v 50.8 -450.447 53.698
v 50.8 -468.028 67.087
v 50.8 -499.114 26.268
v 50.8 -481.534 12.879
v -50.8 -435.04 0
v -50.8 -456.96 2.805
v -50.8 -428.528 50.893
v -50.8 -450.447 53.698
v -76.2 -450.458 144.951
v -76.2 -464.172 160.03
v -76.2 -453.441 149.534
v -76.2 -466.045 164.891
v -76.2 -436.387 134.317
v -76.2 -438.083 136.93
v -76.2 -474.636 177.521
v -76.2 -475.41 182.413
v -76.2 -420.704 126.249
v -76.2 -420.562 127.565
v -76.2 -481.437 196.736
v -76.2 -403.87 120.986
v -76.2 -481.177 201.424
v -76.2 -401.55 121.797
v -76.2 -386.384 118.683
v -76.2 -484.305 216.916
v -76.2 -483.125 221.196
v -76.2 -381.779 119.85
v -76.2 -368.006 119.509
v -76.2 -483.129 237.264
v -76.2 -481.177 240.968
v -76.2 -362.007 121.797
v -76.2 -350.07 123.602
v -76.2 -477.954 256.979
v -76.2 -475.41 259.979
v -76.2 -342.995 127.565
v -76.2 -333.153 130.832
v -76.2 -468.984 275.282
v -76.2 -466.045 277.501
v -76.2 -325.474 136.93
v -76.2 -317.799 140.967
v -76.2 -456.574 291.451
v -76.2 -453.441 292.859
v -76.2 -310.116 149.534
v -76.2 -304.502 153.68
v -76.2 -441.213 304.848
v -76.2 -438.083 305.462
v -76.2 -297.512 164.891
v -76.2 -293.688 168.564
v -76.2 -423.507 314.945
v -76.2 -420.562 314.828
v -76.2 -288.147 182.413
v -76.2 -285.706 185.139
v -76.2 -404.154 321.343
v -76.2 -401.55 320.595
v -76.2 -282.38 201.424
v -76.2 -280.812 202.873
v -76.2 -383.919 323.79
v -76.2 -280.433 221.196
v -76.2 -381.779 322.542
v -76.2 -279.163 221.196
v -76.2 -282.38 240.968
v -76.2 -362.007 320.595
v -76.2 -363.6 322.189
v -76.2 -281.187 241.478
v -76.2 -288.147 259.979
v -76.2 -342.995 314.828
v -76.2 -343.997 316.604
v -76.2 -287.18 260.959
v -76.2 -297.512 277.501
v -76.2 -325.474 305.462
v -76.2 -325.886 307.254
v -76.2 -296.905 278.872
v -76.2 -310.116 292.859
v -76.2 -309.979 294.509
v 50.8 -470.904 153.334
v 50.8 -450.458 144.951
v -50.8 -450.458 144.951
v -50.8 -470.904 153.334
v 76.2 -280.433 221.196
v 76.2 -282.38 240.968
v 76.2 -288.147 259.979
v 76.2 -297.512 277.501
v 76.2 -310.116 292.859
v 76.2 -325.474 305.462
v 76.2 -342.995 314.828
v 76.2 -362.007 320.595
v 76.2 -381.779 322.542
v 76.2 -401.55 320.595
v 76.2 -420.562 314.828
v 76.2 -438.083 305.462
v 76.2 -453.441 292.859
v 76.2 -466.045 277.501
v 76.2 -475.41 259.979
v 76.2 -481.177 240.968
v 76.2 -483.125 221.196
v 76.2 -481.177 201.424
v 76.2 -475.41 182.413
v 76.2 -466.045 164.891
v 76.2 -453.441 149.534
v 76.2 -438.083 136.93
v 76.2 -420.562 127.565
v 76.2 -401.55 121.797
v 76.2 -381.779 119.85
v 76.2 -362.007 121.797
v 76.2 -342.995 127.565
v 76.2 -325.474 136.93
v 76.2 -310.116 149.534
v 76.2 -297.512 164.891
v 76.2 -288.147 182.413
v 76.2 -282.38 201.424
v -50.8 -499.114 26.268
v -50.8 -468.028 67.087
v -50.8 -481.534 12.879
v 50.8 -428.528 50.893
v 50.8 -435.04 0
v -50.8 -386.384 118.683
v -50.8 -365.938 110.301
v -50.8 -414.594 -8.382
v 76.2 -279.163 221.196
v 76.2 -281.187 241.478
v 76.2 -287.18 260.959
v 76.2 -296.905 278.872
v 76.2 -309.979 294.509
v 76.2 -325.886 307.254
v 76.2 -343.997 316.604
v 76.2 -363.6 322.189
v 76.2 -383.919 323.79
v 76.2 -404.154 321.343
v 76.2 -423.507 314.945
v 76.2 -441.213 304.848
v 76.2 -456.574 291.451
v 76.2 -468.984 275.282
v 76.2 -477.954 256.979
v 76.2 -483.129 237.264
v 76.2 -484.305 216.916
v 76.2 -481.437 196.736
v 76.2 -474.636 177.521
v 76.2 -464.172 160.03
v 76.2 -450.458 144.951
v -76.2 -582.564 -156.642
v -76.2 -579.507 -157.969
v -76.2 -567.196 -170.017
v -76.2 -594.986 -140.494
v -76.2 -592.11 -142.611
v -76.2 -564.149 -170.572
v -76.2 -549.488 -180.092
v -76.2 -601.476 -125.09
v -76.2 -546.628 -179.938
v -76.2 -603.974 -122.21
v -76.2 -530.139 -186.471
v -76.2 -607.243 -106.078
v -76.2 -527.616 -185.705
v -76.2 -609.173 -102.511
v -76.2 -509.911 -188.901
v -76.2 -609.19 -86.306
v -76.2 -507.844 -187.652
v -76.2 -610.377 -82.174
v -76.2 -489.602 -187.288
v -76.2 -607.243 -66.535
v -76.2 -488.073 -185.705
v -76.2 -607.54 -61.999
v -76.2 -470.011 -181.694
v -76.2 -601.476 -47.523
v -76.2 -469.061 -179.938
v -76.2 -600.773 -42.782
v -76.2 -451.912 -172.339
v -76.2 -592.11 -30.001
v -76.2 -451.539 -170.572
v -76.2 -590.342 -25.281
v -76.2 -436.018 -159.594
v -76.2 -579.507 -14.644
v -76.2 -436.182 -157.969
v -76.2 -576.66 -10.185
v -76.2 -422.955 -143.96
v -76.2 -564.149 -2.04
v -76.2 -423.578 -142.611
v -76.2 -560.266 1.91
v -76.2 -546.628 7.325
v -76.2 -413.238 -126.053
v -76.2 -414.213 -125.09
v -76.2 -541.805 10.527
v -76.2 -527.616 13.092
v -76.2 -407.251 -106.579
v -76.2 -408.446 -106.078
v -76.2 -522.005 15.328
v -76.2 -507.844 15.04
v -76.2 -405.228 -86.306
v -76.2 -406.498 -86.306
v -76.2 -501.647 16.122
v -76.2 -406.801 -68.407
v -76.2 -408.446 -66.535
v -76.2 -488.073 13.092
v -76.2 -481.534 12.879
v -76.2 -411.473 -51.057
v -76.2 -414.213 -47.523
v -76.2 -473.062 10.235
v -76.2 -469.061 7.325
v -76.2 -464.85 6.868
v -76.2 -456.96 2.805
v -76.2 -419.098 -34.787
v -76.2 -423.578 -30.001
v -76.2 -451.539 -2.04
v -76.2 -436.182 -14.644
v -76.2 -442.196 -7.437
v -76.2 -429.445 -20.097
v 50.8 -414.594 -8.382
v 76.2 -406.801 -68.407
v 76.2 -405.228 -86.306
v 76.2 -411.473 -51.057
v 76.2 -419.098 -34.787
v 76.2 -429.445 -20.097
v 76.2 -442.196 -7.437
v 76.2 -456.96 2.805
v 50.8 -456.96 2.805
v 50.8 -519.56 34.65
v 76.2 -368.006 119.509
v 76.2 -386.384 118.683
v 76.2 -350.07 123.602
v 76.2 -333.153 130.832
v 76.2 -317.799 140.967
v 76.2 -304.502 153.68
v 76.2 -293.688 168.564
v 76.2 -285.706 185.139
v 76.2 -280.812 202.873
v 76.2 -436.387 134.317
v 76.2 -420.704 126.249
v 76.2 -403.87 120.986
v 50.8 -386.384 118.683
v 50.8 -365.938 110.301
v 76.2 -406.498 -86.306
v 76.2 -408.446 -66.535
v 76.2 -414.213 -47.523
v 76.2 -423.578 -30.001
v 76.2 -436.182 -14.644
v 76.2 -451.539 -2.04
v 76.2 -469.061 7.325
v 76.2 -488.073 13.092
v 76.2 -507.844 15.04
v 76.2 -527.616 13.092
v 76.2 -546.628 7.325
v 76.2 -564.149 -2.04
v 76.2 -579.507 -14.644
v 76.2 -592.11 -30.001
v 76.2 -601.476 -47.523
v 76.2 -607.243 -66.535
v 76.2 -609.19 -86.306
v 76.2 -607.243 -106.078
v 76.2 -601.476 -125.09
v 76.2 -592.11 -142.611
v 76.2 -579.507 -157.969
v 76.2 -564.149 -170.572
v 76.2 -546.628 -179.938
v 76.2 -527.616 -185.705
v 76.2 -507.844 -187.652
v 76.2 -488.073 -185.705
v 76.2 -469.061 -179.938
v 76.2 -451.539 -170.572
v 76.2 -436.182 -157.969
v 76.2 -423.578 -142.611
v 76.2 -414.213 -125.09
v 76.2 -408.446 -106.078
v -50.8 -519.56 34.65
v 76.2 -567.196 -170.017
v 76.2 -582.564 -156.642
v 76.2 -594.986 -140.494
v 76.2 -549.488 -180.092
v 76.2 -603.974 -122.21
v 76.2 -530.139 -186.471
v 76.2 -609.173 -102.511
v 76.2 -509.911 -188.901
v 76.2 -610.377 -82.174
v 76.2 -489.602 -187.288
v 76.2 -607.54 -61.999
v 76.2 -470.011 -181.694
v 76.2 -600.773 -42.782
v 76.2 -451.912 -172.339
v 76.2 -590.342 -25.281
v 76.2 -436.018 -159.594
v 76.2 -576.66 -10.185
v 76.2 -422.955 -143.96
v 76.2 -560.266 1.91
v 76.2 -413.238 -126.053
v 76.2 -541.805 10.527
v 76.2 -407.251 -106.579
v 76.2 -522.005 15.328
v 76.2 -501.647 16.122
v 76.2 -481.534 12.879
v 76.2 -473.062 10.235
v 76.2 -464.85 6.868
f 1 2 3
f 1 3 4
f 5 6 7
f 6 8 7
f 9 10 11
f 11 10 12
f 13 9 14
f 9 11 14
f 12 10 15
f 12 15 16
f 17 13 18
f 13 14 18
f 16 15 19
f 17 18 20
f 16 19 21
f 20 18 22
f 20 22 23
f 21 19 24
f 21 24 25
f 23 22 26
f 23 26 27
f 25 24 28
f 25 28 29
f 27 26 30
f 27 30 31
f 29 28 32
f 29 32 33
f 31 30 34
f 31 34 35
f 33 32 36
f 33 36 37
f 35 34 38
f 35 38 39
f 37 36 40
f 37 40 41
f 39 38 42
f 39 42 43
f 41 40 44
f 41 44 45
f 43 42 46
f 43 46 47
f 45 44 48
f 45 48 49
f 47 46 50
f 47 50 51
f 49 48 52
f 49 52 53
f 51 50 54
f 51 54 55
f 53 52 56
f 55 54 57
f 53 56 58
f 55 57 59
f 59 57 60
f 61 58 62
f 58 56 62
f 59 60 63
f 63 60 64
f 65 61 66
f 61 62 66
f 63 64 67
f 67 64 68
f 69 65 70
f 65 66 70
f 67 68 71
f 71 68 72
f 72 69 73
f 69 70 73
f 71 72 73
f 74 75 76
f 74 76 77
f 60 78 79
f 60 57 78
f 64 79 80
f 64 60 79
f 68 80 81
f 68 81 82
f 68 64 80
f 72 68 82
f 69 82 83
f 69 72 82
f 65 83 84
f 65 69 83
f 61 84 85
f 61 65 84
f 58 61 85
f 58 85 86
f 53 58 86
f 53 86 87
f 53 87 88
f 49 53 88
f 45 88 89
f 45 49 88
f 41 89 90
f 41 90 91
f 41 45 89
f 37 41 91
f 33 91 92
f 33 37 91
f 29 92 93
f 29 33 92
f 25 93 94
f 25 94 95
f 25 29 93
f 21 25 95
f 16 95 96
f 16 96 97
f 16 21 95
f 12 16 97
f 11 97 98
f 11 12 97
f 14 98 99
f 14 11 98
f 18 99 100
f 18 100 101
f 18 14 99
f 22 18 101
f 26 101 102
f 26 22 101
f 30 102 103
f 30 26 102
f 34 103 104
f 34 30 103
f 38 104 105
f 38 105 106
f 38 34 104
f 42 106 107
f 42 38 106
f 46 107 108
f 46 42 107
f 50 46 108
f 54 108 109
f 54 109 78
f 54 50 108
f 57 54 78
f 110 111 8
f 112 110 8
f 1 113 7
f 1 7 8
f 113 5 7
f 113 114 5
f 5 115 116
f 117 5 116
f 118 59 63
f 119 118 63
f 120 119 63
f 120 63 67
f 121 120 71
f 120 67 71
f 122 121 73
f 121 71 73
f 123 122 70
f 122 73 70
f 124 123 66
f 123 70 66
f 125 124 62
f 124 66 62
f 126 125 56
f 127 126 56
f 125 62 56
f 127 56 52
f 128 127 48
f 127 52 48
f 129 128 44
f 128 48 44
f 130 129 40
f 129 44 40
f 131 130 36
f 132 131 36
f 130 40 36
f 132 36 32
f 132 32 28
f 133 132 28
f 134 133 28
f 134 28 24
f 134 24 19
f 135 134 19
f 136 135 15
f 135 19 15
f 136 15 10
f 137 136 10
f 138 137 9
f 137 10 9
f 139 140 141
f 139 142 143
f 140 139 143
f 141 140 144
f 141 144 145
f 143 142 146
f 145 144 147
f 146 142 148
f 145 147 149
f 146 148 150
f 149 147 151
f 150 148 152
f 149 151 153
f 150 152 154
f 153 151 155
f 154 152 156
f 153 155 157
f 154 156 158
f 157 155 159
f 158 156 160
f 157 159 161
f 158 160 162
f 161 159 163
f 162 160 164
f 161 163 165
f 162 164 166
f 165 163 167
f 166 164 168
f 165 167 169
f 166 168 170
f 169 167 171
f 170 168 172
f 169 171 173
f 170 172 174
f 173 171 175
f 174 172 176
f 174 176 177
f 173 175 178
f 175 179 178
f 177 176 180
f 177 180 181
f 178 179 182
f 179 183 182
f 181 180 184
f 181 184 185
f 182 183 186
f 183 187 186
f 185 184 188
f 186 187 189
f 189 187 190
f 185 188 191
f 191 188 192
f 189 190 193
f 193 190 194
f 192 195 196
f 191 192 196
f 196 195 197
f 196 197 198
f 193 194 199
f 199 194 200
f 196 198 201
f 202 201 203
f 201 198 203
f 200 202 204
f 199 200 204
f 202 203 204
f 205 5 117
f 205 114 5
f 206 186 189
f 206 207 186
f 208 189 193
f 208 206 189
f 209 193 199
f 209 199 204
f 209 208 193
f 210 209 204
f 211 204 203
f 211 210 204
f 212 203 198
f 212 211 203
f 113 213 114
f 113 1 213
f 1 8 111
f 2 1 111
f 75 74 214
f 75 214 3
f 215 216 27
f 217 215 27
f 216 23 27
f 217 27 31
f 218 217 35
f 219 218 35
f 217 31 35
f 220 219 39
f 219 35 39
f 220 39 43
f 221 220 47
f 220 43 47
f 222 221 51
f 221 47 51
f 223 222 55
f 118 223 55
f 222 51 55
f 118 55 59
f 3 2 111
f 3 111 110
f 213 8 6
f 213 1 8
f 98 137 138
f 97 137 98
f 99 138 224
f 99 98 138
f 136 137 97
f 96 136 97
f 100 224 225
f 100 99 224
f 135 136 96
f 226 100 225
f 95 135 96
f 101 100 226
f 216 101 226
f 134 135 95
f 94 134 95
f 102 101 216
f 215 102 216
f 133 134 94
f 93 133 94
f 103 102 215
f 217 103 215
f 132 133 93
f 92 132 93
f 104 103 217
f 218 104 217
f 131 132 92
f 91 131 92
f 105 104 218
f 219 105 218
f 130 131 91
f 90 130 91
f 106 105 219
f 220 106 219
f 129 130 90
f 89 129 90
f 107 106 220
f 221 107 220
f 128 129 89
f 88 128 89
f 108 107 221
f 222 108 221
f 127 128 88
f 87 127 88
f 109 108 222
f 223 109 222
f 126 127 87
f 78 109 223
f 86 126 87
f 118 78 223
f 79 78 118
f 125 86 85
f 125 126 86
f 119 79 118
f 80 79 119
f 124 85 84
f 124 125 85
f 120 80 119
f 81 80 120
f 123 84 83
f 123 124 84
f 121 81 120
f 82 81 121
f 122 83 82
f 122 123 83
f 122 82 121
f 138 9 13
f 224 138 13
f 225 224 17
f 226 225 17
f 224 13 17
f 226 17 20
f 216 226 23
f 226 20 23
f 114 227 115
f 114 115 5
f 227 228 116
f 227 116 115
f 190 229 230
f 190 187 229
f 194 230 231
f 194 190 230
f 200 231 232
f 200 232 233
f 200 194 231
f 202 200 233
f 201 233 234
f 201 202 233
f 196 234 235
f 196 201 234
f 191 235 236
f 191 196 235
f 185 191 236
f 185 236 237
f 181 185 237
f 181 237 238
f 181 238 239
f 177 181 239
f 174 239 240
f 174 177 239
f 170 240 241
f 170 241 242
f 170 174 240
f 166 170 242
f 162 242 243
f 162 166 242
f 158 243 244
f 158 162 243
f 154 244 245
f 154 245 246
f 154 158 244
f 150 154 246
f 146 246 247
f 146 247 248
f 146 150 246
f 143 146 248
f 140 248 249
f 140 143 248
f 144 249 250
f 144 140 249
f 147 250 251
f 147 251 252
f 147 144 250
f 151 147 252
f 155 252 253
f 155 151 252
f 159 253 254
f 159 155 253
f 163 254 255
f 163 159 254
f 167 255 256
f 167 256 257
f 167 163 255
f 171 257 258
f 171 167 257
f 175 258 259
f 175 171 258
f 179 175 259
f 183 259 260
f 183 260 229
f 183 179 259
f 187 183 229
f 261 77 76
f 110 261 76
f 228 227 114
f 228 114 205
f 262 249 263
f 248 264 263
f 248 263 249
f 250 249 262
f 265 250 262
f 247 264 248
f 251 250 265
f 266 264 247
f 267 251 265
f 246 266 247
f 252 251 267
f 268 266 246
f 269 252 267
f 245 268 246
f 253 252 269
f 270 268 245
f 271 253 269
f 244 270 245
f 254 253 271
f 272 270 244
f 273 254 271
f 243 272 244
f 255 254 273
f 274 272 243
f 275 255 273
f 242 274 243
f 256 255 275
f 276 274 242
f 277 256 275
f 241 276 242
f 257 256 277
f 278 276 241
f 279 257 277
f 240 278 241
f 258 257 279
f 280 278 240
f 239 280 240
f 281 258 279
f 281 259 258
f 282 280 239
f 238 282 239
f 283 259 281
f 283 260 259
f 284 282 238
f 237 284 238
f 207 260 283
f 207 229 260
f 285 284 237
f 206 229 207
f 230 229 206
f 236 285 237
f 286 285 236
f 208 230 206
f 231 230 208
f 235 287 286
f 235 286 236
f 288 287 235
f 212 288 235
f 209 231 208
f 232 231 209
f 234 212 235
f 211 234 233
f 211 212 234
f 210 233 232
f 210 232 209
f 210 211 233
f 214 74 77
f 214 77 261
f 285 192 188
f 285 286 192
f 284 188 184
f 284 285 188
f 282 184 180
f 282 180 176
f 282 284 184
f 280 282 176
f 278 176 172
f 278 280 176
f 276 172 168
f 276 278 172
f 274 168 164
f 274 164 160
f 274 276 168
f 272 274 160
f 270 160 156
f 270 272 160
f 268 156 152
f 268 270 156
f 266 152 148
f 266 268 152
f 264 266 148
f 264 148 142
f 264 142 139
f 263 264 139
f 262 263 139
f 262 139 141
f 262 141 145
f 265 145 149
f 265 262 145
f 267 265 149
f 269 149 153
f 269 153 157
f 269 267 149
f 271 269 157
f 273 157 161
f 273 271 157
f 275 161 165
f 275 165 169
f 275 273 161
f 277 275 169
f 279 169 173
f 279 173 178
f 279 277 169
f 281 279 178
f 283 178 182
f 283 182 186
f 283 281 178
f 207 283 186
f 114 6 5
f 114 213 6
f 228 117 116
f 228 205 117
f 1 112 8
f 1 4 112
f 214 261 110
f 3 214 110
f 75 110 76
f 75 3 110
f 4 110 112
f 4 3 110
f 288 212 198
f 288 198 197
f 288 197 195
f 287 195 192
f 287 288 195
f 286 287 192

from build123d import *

# Parameters (mm, degrees)
F0_R     = 101.346
F1_DEPTH = 76.2
F2_DEPTH = 50.8


with BuildPart() as f1:
    # F0 (on Right) → F1 (new body, symmetric)
    with BuildSketch(Plane.YZ):
        with BuildLine():
            ThreePointArc((-450.457604, 144.951468), (-420.703591, 126.249292), (-386.384052, 118.683457))
            ThreePointArc((-386.384052, 118.683457), (-310.865093, 147.025184), (-279.162597, 221.196057))
            ThreePointArc((-279.162597, 221.196057), (-423.506755, 314.94468), (-450.457604, 144.951468))
        make_face()
        with Locations((-381.778597, 221.196057)):
            Circle(F0_R, mode=Mode.SUBTRACT)
        with BuildLine():
            ThreePointArc((-405.22827, -86.306307), (-419.098488, -34.787091), (-456.959571, 2.804808))
            ThreePointArc((-456.959571, 2.804808), (-468.919275, 8.640458), (-481.533602, 12.879338))
            ThreePointArc((-481.533602, 12.879338), (-589.176733, -148.876859), (-405.22827, -86.306307))
        make_face()
        with Locations((-507.84427, -86.306307)):
            Circle(F0_R, mode=Mode.SUBTRACT)
    extrude(amount=F1_DEPTH, both=True)


with BuildPart() as f2:
    # F0 (on Right) → F2 (new body, symmetric)
    with BuildSketch(Plane.YZ):
        Polygon((-499.113848, 26.268011), (-450.457604, 144.951468), (-470.904061, 153.333831), (-519.560305, 34.650374), align=None)
        Polygon((-468.027503, 67.086513), (-499.113848, 26.268011), (-481.533602, 12.879338), (-450.447258, 53.69784), align=None)
        Polygon((-456.959571, 2.804808), (-435.040295, 0), (-428.527982, 50.893031), (-450.447258, 53.69784), align=None)
        Polygon((-414.593838, -8.382363), (-365.937595, 110.301094), (-386.384052, 118.683457), (-435.040295, 0), align=None)
    extrude(amount=F2_DEPTH, both=True)


solid = Compound([f1.part, f2.part])
